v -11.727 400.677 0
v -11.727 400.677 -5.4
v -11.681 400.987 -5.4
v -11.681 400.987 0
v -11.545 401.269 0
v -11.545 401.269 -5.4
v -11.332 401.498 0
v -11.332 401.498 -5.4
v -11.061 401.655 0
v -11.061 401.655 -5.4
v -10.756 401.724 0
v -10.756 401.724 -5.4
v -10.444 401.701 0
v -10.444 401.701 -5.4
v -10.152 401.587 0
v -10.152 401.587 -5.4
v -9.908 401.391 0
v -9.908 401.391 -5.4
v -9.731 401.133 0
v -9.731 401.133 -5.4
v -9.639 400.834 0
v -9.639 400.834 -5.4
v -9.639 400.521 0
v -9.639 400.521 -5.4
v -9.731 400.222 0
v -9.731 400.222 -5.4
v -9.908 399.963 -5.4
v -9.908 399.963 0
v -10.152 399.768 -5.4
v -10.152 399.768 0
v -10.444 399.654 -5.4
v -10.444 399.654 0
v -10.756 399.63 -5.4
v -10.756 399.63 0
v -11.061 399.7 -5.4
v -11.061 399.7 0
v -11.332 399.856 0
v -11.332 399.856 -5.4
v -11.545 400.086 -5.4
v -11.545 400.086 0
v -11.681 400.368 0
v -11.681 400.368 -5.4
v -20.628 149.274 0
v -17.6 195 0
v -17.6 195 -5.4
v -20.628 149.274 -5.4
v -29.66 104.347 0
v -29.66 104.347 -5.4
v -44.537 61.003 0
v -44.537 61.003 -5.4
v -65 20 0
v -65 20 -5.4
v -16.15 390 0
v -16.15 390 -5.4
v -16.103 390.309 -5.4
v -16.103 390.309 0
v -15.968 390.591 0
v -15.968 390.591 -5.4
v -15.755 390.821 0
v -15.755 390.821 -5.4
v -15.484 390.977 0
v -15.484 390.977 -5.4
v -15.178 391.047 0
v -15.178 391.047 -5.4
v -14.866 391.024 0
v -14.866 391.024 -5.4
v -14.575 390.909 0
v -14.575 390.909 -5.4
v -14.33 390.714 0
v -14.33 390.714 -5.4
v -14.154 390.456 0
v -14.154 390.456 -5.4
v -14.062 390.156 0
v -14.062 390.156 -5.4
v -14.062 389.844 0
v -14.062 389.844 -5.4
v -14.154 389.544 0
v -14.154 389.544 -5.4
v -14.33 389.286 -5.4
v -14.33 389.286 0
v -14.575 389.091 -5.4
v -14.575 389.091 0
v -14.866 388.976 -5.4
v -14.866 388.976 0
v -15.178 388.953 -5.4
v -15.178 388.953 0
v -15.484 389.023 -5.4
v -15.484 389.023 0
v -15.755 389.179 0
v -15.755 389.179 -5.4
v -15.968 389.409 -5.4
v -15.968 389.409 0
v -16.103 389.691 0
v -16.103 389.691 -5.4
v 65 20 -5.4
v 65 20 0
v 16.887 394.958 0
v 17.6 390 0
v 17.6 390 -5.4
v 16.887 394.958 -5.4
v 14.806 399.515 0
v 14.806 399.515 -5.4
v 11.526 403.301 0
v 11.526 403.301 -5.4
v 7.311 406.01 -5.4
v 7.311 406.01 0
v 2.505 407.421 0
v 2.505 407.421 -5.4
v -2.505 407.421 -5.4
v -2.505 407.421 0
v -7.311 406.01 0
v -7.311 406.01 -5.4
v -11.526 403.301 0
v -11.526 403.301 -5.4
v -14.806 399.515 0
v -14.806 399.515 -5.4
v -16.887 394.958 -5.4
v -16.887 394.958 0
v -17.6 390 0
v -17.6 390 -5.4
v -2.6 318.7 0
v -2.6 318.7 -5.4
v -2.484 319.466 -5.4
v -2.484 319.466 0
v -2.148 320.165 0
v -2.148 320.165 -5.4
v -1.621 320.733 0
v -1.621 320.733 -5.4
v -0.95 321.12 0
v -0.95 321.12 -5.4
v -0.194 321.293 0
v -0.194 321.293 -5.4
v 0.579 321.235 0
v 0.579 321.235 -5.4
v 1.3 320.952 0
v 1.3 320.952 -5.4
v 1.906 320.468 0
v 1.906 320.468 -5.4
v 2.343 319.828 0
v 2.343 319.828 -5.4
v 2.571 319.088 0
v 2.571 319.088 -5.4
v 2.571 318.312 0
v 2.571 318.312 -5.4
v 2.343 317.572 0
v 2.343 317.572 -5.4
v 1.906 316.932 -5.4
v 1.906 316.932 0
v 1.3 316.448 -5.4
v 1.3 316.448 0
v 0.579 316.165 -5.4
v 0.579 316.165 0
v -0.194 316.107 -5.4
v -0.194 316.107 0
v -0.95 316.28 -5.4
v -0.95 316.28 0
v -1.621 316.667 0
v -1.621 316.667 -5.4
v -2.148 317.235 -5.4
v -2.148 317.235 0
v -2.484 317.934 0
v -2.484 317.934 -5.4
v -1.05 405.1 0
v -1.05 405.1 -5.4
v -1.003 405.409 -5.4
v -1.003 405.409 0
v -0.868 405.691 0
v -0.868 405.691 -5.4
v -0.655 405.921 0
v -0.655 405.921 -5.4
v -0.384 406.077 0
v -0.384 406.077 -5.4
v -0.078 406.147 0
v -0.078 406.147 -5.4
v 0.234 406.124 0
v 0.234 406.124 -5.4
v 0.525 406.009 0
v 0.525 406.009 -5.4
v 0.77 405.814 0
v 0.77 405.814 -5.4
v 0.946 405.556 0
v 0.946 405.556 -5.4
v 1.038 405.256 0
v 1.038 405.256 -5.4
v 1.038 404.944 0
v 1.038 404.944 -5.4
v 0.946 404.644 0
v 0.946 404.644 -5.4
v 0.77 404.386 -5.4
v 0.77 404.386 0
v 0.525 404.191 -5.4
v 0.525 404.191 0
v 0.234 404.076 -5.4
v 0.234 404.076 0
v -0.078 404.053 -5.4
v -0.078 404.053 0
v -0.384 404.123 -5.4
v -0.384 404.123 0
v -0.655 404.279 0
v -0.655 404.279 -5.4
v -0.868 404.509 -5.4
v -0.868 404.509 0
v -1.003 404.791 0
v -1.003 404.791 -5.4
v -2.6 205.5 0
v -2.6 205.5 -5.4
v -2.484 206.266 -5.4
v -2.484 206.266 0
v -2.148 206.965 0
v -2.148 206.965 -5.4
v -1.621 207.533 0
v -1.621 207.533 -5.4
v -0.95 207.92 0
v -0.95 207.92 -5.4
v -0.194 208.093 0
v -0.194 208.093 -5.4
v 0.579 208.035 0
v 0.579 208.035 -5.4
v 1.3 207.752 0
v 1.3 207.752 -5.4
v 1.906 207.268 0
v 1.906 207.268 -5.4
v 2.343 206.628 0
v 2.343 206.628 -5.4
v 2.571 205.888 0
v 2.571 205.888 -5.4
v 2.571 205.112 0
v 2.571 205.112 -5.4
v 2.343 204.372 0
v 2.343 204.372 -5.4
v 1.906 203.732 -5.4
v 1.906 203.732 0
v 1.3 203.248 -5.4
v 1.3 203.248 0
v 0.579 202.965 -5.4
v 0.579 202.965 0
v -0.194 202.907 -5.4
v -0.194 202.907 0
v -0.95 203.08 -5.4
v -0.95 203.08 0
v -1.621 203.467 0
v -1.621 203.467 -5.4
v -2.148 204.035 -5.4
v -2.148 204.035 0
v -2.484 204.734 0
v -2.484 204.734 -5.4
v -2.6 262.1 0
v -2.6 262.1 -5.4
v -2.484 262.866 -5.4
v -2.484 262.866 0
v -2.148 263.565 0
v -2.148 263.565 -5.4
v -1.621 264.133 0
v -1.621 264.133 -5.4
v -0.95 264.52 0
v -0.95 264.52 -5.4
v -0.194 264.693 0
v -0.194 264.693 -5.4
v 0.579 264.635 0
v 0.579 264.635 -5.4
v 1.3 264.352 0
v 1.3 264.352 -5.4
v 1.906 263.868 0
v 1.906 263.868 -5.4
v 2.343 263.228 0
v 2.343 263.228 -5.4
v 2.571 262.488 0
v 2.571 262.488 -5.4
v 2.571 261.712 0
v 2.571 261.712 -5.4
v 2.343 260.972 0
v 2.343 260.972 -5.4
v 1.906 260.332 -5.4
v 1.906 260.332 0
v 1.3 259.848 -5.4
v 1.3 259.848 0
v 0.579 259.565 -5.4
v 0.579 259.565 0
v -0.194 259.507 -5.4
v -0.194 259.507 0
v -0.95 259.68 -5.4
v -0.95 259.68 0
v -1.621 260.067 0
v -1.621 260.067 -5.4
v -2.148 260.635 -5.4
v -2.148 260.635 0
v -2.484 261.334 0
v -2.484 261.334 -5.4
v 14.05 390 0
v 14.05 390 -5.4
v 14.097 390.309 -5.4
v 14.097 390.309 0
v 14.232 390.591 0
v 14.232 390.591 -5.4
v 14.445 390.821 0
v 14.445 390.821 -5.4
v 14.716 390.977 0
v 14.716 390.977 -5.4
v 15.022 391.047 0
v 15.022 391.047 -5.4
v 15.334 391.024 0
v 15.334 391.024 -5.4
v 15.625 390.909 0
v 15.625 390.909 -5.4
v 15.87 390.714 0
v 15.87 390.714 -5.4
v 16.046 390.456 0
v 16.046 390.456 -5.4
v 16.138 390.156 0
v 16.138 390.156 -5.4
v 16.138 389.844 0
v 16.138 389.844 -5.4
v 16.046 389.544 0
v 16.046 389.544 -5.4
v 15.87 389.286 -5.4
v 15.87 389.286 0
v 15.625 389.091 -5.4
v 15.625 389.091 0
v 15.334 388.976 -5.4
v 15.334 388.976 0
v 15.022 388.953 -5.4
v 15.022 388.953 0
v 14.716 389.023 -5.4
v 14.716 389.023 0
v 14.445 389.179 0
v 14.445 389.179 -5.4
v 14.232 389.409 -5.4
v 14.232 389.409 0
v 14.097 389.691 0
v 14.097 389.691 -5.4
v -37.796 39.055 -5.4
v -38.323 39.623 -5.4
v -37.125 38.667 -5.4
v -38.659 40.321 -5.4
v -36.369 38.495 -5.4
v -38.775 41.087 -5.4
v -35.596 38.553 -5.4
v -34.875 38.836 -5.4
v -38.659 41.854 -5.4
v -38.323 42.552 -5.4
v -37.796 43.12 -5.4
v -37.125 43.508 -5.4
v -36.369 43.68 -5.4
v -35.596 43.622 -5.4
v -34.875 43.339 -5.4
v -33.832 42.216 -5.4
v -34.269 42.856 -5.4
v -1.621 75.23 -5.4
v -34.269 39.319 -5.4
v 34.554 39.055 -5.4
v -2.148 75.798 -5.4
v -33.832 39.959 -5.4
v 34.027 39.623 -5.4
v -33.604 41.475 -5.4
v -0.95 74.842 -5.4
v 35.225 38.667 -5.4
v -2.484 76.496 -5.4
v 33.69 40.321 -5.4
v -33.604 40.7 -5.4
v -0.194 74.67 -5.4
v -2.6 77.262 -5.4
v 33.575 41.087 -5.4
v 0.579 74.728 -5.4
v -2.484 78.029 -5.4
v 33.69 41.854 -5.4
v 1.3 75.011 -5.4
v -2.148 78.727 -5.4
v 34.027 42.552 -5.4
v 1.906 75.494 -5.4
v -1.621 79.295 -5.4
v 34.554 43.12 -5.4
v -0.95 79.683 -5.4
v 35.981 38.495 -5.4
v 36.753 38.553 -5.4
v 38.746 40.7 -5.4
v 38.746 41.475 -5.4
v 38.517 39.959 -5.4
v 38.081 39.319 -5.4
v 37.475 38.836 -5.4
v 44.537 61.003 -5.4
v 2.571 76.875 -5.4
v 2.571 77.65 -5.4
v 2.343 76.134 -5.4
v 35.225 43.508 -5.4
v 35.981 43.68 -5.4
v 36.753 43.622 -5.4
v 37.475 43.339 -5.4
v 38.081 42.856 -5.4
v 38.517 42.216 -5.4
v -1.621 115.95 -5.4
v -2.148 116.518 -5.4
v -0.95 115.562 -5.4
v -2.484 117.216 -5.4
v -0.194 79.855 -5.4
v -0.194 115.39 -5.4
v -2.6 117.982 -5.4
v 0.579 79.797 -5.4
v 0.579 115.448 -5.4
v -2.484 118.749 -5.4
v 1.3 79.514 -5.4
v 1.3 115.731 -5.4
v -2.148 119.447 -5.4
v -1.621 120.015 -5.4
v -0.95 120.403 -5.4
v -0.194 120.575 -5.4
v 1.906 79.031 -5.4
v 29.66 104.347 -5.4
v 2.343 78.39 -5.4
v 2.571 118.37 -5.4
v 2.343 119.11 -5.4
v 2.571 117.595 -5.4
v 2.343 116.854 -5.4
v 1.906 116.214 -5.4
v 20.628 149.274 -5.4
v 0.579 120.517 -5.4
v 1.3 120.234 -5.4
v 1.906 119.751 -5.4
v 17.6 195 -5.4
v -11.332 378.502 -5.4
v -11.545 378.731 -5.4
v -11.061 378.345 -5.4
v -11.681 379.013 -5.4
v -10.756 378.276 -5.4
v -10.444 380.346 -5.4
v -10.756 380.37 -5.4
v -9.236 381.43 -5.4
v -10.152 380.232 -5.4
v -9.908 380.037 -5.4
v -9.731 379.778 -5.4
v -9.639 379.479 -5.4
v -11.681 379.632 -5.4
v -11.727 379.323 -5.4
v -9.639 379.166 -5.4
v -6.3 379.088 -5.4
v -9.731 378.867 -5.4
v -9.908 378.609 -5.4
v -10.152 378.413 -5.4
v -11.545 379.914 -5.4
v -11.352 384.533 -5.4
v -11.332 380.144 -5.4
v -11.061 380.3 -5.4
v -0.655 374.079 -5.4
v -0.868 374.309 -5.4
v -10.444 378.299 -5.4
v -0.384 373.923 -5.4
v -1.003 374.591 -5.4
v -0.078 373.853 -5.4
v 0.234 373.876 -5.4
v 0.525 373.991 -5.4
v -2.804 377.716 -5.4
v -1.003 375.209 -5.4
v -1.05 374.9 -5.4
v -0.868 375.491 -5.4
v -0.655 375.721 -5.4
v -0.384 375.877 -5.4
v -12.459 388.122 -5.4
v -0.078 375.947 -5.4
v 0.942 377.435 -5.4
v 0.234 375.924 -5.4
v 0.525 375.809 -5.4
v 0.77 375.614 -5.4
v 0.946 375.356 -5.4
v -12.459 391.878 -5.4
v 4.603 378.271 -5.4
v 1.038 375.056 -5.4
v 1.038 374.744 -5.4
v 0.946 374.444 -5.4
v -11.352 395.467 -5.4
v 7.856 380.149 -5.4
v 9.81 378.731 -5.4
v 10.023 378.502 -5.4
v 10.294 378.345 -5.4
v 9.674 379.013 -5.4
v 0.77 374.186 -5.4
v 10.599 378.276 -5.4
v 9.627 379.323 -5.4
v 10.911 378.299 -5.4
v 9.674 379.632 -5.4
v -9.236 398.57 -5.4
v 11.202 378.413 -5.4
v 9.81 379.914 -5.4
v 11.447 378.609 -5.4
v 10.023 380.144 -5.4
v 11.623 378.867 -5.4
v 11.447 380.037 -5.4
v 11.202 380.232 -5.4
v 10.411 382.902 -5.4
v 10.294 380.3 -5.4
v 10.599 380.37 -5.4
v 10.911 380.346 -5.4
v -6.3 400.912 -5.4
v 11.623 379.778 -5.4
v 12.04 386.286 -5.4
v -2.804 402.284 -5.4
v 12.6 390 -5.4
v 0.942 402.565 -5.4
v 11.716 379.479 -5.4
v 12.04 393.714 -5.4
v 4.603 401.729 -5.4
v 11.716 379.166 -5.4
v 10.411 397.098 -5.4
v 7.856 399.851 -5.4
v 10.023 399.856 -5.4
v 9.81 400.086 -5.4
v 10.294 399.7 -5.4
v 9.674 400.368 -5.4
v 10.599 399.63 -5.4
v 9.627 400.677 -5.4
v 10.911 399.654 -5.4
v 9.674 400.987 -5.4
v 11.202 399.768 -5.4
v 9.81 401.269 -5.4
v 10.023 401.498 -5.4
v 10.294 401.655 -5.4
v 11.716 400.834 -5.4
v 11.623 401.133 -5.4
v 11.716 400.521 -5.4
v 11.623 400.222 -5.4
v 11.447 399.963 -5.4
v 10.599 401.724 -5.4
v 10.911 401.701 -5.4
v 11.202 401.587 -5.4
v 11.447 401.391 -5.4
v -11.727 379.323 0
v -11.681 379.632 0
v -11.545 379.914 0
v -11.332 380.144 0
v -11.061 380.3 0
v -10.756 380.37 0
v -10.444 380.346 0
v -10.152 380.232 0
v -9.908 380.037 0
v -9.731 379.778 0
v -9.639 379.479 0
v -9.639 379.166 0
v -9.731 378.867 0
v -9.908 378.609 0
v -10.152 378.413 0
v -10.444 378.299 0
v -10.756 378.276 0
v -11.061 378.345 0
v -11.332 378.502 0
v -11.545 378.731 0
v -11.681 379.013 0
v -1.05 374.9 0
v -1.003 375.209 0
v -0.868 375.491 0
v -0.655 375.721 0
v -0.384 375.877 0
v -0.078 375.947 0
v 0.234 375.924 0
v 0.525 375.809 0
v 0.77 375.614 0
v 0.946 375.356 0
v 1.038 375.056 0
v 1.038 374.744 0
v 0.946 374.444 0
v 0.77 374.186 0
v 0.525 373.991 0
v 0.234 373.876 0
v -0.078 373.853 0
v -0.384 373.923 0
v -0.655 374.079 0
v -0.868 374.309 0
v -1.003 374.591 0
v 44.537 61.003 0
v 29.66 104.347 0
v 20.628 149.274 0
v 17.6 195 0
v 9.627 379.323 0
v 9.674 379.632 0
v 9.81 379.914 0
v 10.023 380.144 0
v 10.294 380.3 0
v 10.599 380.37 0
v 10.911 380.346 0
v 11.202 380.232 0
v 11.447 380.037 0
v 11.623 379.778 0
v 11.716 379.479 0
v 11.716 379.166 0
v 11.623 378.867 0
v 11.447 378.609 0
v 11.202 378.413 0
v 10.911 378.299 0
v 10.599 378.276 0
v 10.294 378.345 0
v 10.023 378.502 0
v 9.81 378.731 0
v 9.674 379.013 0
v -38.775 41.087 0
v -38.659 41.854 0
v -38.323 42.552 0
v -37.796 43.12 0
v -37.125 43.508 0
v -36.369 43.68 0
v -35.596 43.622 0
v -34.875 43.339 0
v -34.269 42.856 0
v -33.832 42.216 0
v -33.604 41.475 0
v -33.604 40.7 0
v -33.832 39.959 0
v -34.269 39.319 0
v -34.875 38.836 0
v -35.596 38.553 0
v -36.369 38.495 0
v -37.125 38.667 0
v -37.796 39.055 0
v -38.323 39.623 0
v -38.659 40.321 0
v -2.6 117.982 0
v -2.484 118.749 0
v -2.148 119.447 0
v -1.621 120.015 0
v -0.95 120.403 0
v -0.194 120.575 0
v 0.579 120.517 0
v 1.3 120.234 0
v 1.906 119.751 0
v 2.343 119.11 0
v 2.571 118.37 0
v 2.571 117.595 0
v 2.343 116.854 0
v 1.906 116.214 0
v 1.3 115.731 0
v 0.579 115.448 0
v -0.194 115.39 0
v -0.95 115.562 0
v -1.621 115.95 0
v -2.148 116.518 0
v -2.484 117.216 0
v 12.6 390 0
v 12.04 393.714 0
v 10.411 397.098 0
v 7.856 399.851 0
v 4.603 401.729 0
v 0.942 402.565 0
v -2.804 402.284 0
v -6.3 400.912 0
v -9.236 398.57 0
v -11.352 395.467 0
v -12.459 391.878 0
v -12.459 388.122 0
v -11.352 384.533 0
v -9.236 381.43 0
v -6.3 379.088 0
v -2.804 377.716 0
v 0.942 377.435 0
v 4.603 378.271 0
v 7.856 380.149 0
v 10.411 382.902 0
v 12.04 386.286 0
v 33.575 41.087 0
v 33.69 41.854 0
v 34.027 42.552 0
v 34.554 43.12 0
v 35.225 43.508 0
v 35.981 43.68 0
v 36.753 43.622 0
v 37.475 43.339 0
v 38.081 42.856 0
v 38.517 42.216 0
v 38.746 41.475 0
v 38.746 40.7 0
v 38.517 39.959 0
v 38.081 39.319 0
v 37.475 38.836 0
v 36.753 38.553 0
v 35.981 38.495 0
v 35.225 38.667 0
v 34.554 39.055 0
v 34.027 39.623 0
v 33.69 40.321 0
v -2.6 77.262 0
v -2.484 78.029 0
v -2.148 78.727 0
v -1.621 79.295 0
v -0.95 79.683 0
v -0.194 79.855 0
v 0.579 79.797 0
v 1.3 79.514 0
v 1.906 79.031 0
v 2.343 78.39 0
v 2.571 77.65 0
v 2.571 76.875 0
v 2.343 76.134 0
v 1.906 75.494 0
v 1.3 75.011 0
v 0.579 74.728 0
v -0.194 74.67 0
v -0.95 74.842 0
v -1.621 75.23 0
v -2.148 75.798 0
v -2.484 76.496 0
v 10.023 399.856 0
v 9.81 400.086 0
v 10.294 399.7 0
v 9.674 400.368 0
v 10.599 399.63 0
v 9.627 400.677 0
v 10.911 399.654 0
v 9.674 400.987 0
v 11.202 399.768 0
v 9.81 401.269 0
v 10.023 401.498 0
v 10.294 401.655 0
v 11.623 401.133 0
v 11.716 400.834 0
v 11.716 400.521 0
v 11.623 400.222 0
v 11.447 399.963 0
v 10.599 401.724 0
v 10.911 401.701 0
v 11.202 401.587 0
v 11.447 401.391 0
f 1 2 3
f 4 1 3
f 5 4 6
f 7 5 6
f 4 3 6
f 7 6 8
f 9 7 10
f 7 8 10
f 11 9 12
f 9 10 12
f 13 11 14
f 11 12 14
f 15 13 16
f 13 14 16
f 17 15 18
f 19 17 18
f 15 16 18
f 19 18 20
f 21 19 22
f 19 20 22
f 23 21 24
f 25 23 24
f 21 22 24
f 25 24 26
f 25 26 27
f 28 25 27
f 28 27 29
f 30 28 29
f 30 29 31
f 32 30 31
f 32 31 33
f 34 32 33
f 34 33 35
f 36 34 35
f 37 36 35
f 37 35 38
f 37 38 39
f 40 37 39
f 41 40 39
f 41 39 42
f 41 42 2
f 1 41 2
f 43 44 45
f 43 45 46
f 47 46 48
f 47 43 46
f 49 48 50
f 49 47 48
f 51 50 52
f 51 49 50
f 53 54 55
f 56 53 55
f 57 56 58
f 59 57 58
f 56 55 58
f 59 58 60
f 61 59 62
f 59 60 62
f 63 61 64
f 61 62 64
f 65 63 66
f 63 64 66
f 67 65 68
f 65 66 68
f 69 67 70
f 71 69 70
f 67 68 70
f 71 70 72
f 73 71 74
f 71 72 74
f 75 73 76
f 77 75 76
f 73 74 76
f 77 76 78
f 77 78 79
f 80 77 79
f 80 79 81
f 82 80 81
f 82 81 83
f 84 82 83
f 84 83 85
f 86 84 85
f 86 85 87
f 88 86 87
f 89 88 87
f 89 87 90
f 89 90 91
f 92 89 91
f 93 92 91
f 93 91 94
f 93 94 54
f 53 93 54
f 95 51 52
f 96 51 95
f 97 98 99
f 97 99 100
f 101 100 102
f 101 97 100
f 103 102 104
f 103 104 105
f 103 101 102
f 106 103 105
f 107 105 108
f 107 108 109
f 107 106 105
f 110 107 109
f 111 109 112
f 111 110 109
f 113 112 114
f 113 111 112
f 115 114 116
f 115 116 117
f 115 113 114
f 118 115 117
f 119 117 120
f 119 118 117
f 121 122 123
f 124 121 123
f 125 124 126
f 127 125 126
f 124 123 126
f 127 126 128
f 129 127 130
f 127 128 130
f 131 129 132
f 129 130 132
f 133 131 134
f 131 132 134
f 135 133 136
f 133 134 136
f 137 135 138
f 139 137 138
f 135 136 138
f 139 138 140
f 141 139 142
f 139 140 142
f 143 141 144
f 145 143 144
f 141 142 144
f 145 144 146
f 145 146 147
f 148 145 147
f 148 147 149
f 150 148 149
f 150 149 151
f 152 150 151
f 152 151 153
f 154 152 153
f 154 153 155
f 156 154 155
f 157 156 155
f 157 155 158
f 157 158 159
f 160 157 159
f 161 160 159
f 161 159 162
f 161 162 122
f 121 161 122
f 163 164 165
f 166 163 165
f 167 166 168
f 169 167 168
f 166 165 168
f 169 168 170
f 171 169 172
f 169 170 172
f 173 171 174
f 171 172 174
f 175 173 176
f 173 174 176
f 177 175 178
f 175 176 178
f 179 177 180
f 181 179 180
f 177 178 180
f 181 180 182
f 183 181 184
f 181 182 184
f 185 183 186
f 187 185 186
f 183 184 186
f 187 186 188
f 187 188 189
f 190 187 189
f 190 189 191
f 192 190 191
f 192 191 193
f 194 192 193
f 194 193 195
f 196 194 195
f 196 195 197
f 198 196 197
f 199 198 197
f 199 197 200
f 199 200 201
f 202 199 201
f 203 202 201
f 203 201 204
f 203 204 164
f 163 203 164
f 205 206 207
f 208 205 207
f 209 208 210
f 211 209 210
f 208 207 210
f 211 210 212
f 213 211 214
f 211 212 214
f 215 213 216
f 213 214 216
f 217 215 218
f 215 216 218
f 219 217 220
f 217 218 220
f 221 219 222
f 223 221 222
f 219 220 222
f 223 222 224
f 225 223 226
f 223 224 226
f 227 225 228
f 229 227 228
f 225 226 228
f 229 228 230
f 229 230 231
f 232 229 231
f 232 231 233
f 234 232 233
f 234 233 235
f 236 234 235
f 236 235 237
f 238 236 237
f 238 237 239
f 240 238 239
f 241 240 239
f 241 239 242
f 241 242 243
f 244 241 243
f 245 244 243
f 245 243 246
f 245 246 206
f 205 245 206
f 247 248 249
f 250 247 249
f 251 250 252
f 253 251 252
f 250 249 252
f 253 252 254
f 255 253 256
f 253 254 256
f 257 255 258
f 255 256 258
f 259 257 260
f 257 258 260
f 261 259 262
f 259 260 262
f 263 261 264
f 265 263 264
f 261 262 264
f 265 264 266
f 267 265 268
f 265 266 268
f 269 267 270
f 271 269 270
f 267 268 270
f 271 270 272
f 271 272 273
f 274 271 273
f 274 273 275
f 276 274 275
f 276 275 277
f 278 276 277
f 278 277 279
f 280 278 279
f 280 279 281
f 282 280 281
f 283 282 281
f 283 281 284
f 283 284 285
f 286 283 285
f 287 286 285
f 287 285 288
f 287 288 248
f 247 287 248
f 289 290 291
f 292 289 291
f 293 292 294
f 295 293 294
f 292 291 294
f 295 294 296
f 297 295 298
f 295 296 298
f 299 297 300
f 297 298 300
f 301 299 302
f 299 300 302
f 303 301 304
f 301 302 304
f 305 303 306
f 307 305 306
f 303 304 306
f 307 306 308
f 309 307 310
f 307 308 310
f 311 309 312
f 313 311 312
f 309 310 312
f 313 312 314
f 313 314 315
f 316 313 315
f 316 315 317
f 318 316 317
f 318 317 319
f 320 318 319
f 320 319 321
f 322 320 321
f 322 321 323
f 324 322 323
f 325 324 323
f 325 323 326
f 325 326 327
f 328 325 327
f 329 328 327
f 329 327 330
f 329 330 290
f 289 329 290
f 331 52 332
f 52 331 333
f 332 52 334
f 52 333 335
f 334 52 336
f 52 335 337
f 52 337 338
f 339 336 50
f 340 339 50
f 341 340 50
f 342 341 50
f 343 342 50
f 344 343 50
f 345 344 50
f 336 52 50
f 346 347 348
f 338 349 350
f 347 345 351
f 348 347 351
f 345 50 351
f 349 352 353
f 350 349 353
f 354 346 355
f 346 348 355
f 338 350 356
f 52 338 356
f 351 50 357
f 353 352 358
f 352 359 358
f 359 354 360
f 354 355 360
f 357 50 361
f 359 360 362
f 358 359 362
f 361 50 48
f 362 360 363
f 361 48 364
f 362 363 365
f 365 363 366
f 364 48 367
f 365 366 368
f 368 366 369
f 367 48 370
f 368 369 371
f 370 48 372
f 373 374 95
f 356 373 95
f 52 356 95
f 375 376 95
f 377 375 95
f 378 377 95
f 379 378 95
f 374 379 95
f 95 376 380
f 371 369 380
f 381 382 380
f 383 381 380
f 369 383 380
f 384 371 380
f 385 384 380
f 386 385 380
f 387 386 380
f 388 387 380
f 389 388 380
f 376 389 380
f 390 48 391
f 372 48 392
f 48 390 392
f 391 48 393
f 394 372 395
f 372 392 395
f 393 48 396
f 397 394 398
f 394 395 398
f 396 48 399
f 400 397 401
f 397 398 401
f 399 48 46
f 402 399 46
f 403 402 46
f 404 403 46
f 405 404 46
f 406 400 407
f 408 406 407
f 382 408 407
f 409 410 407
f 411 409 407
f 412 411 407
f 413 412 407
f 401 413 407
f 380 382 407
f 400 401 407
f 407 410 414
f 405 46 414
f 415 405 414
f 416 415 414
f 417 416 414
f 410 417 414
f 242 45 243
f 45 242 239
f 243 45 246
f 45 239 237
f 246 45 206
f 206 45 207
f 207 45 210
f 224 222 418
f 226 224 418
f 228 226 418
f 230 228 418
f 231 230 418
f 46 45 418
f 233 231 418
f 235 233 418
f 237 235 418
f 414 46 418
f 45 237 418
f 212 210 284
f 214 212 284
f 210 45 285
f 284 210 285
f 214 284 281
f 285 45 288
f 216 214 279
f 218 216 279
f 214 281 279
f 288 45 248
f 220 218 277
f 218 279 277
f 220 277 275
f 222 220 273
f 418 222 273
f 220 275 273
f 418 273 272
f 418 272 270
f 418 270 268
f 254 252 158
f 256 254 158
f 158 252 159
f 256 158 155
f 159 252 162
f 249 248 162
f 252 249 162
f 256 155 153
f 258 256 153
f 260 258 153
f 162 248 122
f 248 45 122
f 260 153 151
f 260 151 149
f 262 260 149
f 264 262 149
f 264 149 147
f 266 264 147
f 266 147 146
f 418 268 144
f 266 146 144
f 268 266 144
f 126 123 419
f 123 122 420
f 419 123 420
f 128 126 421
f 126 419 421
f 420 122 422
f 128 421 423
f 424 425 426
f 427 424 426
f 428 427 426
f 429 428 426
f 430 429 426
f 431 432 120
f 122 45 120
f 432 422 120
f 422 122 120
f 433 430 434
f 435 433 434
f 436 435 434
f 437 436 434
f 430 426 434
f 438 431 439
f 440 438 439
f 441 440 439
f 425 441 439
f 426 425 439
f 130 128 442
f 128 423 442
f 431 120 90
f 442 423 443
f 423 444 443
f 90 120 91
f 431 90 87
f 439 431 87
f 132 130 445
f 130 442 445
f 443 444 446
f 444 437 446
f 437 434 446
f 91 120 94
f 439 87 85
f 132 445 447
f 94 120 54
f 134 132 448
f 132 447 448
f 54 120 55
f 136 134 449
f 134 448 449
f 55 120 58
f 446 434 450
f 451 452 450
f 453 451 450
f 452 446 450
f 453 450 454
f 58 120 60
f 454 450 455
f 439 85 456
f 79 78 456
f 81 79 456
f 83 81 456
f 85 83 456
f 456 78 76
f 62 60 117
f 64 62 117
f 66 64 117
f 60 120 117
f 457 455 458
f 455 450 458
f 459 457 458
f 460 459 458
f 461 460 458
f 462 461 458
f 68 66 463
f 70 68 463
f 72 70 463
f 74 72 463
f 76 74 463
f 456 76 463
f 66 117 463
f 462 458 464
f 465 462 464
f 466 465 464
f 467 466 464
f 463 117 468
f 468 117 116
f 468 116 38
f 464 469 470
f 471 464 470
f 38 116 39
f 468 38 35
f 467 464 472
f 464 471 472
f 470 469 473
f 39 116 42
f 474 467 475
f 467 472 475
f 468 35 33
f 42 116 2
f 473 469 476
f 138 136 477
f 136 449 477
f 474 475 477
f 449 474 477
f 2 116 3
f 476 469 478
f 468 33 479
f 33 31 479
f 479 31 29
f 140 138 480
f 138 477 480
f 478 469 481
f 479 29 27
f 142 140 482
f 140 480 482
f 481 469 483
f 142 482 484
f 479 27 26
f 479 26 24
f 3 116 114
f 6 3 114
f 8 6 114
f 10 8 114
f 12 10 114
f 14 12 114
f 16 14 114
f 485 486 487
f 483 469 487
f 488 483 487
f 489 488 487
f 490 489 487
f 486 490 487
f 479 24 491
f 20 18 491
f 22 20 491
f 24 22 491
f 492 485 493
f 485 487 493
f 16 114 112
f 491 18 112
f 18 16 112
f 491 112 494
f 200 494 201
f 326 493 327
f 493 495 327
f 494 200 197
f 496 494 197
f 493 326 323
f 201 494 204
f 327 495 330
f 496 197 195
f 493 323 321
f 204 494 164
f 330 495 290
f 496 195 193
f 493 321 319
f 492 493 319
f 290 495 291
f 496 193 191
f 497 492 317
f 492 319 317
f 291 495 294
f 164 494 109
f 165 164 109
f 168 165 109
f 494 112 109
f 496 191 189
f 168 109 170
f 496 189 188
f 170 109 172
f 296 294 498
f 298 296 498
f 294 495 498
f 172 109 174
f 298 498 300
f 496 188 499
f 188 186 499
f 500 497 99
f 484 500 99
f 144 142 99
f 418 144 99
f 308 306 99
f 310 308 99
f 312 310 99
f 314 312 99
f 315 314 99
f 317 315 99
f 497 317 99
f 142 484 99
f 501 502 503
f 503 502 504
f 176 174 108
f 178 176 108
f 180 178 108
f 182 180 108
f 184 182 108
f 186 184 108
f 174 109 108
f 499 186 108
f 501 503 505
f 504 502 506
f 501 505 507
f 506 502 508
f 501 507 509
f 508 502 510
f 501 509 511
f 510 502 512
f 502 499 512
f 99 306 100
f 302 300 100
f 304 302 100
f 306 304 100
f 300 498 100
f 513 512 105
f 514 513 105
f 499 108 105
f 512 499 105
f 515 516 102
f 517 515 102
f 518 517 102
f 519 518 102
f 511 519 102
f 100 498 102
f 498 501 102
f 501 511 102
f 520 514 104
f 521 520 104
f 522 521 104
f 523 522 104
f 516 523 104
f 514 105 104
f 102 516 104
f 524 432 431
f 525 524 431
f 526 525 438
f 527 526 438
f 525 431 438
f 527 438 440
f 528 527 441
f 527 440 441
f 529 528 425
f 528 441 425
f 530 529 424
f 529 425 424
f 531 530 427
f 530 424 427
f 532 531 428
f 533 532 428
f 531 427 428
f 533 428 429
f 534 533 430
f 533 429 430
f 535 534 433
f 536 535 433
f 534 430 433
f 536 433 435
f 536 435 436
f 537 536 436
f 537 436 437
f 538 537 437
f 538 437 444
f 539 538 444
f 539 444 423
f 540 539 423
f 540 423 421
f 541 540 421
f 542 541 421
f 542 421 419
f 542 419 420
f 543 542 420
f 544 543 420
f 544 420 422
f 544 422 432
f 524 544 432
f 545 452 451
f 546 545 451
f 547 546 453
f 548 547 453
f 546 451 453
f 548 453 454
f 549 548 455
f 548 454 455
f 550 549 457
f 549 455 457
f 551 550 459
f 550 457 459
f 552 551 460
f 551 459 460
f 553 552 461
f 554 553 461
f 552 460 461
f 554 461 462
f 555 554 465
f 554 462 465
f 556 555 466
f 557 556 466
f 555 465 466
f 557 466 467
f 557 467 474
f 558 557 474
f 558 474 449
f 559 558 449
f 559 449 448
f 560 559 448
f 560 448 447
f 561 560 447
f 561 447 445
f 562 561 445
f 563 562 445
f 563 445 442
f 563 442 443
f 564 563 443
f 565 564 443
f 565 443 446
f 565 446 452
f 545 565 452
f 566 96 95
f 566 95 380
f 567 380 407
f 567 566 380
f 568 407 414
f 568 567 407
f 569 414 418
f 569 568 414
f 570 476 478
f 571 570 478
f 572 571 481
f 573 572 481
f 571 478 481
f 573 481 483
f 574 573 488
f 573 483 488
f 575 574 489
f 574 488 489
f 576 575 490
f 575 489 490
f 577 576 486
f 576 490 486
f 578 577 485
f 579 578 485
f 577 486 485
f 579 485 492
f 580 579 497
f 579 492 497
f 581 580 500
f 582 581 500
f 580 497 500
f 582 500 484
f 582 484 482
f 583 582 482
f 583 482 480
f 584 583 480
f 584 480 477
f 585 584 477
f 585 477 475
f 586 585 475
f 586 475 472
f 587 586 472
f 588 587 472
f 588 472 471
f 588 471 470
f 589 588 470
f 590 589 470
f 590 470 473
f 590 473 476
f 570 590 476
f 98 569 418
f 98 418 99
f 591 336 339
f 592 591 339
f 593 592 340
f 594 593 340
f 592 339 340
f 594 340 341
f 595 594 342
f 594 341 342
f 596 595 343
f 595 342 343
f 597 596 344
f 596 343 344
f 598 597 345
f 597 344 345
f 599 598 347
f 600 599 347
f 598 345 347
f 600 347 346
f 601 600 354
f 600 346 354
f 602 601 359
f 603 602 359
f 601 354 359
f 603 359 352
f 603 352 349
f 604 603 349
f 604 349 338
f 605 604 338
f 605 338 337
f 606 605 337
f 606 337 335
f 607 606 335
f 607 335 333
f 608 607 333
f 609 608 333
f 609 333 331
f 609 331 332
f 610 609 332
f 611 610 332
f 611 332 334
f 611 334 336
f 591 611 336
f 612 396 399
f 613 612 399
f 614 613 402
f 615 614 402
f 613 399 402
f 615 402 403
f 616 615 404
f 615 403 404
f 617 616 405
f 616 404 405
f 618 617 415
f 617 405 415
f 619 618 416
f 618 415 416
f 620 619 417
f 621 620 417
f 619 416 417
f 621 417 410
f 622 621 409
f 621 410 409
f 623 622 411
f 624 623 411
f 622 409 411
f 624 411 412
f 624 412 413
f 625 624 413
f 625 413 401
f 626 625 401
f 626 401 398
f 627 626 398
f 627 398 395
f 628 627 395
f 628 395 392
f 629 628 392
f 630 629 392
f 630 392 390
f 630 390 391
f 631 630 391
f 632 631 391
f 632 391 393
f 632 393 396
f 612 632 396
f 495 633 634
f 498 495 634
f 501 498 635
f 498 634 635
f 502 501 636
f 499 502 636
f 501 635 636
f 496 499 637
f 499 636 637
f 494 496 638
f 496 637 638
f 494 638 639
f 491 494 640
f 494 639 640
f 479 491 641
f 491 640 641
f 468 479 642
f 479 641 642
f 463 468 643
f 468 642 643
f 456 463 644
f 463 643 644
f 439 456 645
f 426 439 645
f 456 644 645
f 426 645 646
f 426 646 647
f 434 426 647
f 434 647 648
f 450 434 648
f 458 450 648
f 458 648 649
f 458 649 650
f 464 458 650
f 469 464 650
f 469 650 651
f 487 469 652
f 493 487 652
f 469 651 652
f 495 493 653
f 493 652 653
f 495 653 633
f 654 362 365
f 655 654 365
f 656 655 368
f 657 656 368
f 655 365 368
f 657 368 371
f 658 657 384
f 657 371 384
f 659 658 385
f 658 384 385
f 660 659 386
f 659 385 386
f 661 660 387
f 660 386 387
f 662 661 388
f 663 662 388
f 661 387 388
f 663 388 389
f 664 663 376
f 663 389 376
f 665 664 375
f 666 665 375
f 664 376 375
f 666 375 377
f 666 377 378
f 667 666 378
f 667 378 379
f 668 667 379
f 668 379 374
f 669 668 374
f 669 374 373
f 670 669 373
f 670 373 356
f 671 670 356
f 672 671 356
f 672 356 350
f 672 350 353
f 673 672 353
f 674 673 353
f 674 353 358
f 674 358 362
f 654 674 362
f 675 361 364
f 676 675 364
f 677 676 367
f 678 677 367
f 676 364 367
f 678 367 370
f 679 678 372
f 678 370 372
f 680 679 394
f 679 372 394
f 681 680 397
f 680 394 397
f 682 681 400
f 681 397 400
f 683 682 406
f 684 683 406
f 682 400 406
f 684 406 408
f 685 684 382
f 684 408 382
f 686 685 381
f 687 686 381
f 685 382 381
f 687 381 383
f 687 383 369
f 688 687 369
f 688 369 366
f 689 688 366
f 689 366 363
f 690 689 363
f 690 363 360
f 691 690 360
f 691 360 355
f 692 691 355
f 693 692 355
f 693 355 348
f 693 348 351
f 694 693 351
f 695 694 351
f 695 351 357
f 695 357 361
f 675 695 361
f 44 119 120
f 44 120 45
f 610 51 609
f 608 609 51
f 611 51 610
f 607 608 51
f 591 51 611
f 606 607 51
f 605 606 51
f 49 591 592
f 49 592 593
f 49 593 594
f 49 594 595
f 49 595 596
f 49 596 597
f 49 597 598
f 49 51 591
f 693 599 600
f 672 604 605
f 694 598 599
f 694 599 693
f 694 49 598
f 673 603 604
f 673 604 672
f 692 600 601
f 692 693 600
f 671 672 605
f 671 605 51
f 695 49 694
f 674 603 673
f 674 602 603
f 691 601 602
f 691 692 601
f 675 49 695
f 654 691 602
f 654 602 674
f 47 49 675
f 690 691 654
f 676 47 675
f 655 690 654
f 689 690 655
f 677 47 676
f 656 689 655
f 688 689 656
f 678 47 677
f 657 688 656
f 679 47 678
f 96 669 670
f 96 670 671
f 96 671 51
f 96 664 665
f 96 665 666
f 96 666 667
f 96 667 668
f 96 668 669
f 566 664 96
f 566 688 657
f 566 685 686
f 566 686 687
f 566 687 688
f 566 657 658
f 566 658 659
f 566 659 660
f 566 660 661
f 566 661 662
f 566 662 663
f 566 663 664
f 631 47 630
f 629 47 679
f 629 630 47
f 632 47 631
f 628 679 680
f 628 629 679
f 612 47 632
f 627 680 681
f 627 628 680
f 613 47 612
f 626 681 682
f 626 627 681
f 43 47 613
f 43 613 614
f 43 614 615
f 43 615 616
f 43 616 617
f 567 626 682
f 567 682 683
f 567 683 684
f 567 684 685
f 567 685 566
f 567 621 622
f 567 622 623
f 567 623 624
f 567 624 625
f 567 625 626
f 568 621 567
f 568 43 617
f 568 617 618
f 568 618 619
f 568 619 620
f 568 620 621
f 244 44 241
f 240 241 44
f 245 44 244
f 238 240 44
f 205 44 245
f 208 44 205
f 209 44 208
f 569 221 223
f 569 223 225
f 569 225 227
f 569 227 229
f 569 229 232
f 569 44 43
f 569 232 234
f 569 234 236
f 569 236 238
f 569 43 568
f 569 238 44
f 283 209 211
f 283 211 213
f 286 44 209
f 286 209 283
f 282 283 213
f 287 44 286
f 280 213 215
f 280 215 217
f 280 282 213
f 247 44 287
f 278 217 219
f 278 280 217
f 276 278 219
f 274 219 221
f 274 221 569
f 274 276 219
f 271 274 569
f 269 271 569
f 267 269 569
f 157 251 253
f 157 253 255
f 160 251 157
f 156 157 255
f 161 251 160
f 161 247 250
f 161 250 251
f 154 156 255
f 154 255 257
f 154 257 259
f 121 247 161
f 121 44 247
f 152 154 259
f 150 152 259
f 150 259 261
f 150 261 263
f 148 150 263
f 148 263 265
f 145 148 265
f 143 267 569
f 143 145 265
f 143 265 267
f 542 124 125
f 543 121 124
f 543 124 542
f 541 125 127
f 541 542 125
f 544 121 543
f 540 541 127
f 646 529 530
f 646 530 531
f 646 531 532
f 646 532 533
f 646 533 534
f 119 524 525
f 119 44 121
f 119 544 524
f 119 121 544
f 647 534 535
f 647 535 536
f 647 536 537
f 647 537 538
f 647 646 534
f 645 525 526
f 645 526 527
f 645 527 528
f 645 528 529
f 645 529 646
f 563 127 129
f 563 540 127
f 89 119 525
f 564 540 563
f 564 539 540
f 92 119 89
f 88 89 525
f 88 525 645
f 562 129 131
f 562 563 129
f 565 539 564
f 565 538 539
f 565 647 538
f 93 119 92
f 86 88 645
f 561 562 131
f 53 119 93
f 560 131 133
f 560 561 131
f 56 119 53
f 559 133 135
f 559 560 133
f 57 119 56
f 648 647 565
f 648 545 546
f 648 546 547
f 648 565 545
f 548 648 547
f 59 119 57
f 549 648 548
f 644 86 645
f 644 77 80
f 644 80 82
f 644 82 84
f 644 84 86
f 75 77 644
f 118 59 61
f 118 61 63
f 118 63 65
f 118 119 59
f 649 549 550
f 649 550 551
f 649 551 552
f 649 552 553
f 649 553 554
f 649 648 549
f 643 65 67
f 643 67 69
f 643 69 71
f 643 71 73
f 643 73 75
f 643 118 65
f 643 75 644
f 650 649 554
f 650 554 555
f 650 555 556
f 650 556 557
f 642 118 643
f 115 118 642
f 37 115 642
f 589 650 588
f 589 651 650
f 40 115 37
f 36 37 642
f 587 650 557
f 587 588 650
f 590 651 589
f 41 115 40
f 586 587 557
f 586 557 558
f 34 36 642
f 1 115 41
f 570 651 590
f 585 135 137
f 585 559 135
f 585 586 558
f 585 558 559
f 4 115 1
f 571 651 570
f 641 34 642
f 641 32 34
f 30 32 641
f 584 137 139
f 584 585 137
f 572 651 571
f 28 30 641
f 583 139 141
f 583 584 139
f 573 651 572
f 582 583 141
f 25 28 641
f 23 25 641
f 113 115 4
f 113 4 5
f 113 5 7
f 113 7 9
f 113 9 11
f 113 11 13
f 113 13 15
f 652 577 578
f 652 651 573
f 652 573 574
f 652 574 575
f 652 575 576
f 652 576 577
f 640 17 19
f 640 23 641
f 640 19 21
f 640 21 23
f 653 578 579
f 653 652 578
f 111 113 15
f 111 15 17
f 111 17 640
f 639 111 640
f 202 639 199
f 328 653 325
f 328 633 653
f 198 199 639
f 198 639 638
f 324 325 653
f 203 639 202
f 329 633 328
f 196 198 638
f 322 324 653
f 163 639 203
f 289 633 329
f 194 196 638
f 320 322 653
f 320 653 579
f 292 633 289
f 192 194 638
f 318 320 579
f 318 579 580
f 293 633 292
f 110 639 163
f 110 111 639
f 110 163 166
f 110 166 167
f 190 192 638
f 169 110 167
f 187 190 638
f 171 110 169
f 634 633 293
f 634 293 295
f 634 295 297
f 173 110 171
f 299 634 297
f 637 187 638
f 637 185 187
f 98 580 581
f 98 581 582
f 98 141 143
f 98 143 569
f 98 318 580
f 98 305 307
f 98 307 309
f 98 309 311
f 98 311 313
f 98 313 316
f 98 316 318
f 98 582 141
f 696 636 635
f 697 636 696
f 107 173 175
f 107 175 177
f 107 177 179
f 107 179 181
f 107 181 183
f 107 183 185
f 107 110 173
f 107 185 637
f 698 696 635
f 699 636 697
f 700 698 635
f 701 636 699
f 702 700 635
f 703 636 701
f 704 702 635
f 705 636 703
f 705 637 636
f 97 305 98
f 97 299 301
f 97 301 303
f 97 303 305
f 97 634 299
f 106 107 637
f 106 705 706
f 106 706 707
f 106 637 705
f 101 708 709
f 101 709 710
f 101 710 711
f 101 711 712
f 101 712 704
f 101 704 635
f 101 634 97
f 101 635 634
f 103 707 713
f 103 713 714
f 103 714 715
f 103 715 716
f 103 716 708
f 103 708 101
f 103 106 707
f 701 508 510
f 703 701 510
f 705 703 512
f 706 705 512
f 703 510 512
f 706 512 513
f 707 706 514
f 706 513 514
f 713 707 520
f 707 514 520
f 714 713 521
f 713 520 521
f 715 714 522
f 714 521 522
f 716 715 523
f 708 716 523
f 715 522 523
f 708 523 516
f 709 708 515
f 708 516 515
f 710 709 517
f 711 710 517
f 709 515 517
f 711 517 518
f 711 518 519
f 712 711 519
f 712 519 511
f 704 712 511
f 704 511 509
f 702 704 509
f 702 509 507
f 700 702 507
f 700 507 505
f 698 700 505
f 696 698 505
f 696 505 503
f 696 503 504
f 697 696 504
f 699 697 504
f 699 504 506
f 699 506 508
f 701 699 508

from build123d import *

# Parameters (mm, degrees)
SKETCH2_R           = 12.6
BOSS_EXTRUDE1_DEPTH = 5.4
SKETCH3_R           = 1.05
SKETCH3_R_2         = 2.6
CUT_EXTRUDE1_DEPTH  = 413.785561763


with BuildPart() as part:
    # Sketch2 → Boss-Extrude1 (new body)
    with BuildSketch(Plane.XY):
        with BuildLine():
            Line((-65, 20), (65, 20))
            ThreePointArc((65, 20), (29.659714989, 104.34714566), (17.6, 195))
            Line((17.6, 195), (17.6, 390))
            ThreePointArc((17.6, 390), (0, 407.6), (-17.6, 390))
            Line((-17.6, 390), (-17.6, 195))
            ThreePointArc((-17.6, 195), (-29.659714989, 104.34714566), (-65, 20))
        make_face()
        with Locations((0, 390)):
            Circle(SKETCH2_R, mode=Mode.SUBTRACT)
    extrude(amount=-BOSS_EXTRUDE1_DEPTH)

    # Sketch3 → Cut-Extrude1 (cut, through all)
    with BuildSketch(Plane(origin=(0, 0, -5.4), x_dir=(-1, 0, 0), z_dir=(0, 0, -1))):
        with Locations((10.677312396, 400.677312396)):
            Circle(SKETCH3_R)
        with Locations((0, 405.1)):
            Circle(SKETCH3_R)
        with Locations((-10.677312396, 400.677312396)):
            Circle(SKETCH3_R)
        with Locations((-15.1, 390)):
            Circle(SKETCH3_R)
        with Locations((-10.677312396, 379.322687604)):
            Circle(SKETCH3_R)
        with Locations((0, 374.9)):
            Circle(SKETCH3_R)
        with Locations((10.677312396, 379.322687604)):
            Circle(SKETCH3_R)
        with Locations((15.1, 390)):
            Circle(SKETCH3_R)
        with Locations((0, 262.1)):
            Circle(SKETCH3_R_2)
        with Locations((0, 318.7)):
            Circle(SKETCH3_R_2)
        with Locations((-36.174923221, 41.087461611)):
            Circle(SKETCH3_R_2)
        with Locations((36.174923221, 41.087461611)):
            Circle(SKETCH3_R_2)
        with Locations((0, 77.262384832)):
            Circle(SKETCH3_R_2)
        with Locations((0, 117.98239975)):
            Circle(SKETCH3_R_2)
        with Locations((0, 205.5)):
            Circle(SKETCH3_R_2)
    extrude(amount=-CUT_EXTRUDE1_DEPTH, mode=Mode.SUBTRACT)


solid = part.part
